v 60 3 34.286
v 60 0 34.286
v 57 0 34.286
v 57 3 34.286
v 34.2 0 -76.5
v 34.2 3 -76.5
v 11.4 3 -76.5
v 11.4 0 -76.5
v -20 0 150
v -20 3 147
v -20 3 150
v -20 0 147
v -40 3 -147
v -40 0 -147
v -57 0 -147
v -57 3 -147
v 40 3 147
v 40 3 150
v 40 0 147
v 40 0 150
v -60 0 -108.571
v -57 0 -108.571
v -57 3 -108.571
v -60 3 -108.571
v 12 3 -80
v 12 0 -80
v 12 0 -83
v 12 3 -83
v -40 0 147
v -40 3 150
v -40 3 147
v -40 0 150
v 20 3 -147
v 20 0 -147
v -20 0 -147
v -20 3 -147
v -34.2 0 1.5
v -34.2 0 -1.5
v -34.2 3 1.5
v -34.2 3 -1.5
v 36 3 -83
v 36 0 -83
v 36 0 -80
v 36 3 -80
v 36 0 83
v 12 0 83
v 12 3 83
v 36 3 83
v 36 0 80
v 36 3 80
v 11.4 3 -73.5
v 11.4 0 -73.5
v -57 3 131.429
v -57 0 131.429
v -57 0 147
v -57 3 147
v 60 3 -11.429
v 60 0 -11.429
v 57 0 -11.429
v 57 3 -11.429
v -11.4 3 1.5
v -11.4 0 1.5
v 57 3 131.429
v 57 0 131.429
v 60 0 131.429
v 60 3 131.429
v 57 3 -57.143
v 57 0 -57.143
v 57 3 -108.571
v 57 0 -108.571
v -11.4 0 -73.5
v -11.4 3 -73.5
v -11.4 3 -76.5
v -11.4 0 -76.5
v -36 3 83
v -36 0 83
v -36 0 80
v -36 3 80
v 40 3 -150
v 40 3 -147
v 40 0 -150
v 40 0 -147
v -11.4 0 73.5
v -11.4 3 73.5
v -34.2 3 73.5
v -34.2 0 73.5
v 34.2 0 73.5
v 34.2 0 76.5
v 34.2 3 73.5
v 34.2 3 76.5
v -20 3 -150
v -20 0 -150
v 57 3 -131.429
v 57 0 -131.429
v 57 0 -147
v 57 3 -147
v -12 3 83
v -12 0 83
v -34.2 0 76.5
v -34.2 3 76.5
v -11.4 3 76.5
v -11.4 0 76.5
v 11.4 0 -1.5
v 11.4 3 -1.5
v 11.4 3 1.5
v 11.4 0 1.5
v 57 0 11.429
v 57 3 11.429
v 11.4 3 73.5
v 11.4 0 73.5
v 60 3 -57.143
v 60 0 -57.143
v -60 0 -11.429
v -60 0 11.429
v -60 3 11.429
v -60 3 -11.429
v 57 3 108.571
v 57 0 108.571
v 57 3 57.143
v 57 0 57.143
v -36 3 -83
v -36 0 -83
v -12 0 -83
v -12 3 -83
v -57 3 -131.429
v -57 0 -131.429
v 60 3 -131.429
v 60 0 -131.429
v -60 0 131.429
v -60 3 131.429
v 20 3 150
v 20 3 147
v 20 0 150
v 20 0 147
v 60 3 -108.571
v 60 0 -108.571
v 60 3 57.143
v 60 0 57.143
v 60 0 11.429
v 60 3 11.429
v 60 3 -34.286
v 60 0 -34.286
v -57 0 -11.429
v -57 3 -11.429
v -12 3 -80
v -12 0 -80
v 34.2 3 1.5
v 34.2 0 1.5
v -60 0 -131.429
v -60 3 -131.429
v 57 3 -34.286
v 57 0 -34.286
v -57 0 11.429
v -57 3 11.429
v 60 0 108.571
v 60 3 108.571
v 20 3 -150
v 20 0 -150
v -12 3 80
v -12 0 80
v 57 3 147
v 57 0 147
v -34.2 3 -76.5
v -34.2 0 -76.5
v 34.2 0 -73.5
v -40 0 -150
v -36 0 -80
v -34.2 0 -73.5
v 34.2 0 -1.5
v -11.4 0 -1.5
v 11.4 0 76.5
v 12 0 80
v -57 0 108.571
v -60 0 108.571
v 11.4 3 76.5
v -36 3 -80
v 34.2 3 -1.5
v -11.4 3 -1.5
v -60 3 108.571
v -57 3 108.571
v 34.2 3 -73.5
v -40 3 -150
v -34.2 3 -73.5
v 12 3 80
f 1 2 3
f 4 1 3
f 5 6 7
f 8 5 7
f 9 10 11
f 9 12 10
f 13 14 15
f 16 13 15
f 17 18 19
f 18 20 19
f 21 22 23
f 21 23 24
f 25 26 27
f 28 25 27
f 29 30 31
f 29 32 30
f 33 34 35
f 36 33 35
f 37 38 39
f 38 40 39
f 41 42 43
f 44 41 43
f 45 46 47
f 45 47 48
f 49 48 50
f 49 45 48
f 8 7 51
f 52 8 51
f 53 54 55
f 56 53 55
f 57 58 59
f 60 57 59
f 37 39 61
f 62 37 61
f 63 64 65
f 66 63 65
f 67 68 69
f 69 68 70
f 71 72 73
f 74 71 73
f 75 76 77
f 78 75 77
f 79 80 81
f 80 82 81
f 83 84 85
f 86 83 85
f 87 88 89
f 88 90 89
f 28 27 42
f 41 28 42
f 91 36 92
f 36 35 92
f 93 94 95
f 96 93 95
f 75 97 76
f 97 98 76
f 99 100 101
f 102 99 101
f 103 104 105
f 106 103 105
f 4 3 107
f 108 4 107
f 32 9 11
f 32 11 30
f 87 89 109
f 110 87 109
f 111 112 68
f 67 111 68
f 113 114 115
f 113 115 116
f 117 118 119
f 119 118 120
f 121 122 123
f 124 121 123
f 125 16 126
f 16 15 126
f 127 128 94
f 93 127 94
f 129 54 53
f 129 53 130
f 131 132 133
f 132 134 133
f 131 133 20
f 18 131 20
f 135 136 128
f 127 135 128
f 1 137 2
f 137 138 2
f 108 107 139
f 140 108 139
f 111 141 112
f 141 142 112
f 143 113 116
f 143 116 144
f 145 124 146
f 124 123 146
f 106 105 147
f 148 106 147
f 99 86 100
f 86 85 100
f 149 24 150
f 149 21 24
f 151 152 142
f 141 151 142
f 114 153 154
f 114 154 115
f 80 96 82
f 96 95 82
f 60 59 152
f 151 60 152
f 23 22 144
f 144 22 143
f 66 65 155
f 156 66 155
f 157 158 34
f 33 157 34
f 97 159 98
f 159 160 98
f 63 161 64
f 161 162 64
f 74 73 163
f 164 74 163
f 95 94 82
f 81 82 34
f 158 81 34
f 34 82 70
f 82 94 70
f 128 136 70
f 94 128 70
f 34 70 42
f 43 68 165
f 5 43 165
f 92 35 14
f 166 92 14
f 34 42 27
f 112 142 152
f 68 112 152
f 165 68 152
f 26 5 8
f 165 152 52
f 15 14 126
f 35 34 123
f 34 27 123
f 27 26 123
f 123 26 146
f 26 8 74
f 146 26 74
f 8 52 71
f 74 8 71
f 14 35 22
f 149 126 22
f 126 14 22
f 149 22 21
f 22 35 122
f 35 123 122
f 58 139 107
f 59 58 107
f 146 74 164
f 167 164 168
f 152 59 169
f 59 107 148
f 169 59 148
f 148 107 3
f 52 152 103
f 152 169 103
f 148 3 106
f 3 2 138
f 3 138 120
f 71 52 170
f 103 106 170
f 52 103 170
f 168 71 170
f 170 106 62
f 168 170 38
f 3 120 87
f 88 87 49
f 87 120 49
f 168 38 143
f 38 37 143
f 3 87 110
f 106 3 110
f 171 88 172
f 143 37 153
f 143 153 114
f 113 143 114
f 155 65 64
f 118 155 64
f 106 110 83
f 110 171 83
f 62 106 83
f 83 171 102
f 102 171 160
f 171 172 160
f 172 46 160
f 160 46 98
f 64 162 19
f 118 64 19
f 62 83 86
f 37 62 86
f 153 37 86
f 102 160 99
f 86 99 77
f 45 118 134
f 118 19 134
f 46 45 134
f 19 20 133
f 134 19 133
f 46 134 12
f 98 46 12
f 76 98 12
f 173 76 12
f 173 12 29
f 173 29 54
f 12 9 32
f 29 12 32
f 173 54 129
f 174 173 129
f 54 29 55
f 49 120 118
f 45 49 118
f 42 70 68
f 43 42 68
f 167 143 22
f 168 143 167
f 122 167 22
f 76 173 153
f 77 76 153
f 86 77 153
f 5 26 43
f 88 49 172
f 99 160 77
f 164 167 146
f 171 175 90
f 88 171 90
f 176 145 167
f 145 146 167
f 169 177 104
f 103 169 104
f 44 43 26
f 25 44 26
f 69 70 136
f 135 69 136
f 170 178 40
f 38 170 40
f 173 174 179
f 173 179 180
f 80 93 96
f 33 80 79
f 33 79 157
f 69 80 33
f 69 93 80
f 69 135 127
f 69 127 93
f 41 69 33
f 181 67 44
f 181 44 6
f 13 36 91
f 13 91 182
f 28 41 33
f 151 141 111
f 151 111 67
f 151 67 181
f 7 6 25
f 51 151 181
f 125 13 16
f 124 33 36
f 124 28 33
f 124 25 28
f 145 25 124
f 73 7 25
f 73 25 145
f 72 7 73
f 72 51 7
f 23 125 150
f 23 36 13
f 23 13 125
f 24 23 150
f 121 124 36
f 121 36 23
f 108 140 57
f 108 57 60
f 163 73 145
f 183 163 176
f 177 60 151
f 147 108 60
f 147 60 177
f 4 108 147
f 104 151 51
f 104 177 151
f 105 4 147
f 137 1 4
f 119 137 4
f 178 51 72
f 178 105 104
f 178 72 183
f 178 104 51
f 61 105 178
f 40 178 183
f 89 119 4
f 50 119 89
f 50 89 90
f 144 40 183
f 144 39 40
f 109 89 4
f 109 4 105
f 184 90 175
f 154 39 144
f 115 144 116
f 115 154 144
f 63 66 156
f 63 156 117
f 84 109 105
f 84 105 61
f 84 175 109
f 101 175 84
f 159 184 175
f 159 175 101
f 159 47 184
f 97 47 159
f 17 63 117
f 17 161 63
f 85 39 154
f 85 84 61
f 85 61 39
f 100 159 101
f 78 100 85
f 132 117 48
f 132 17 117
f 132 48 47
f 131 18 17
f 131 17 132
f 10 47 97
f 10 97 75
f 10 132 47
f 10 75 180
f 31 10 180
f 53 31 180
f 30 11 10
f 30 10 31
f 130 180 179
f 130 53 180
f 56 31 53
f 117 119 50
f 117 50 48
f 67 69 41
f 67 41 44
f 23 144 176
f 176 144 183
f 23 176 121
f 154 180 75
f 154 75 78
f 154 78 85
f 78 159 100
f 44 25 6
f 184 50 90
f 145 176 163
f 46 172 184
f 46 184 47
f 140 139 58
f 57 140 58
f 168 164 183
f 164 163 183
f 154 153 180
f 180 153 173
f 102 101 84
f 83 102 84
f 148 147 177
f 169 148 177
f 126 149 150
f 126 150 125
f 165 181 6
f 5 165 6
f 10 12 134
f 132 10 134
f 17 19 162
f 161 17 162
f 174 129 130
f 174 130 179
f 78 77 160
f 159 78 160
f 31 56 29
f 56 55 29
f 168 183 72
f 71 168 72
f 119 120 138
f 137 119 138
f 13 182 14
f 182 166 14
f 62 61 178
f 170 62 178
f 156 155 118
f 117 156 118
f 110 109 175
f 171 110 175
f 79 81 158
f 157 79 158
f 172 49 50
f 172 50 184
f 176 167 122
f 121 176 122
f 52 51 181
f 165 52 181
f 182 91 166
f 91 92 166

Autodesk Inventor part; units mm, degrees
ref_plane "YZ Plane" through (0, 0, 0) normal (1, 0, 0) x (0, 1, 0)
ref_plane "XZ Plane" through (0, 0, 0) normal (0, 1, 0) x (-1, 0, 0)
ref_plane "XY Plane" through (0, 0, 0) normal (0, 0, 1) x (1, 0, 0)
sketch "Sketch1" plane through (0, 0, 0) normal (0, 1, 0) x (-1, 0, 0)
  line L0 (20, 147) -> (20, 150)
  line L1 (20, 150) -> (40, 150)
  line L2 (40, 150) -> (40, 147)
  line L3 (-20, 147) -> (-20, 150)
  line L4 (-20, 150) -> (-40, 150)
  line L5 (-40, 150) -> (-40, 147)
  line L6 (-40, 147) -> (-57, 147)
  line L7 (57, 147) -> (40, 147)
  line L8 (20, 147) -> (-20, 147)
  line L9 (20, -147) -> (20, -150)
  line L10 (20, -150) -> (40, -150)
  line L11 (40, -150) -> (40, -147)
  line L12 (-40, -147) -> (-40, -150)
  line L13 (-40, -150) -> (-20, -150)
  line L14 (-20, -150) -> (-20, -147)
  line L15 (40, -147) -> (57, -147)
  line L16 (-57, -147) -> (-40, -147)
  line L17 (-20, -147) -> (20, -147)
  line L18 (-57, 131.4286) -> (-60, 131.4286)
  line L19 (-60, 131.4286) -> (-60, 108.5714)
  line L20 (-60, 108.5714) -> (-57, 108.5714)
  line L21 (-57, 11.4286) -> (-60, 11.4286)
  line L22 (-60, 11.4286) -> (-60, -11.4286)
  line L23 (-60, -11.4286) -> (-57, -11.4286)
  line L24 (-57, -108.5714) -> (-60, -108.5714)
  line L25 (-60, -108.5714) -> (-60, -131.4286)
  line L26 (-60, -131.4286) -> (-57, -131.4286)
  line L27 (-57, 147) -> (-57, 131.4286)
  line L28 (-57, -131.4286) -> (-57, -147)
  line L29 (57, 131.4286) -> (60, 131.4286)
  line L30 (60, 131.4286) -> (60, 108.5714)
  line L31 (60, 108.5714) -> (57, 108.5714)
  line L32 (57, 11.4286) -> (60, 11.4286)
  line L33 (60, 11.4286) -> (60, -11.4286)
  line L34 (60, -11.4286) -> (57, -11.4286)
  line L35 (57, -108.5714) -> (60, -108.5714)
  line L36 (60, -108.5714) -> (60, -131.4286)
  line L37 (60, -131.4286) -> (57, -131.4286)
  line L38 (57, 131.4286) -> (57, 147)
  line L39 (57, 11.4286) -> (57, 108.5714)
  line L40 (57, -147) -> (57, -131.4286)
  line L41 (57, -108.5714) -> (57, -11.4286)
  line L42 (-57, 57.1429) -> (-60, 57.1429)
  line L43 (-60, 57.1429) -> (-60, 34.2857)
  line L44 (-60, 34.2857) -> (-57, 34.2857)
  line L45 (-57, -34.2857) -> (-60, -34.2857)
  line L46 (-60, -34.2857) -> (-60, -57.1429)
  line L47 (-60, -57.1429) -> (-57, -57.1429)
  line L48 (-57, 108.5714) -> (-57, 57.1429)
  line L49 (-57, 34.2857) -> (-57, 11.4286)
  line L50 (-57, -11.4286) -> (-57, -34.2857)
  line L51 (-57, -57.1429) -> (-57, -108.5714)
  line L52 (-36, 80) -> (-12, 80)
  line L53 (-12, 80) -> (-12, 83)
  line L54 (-12, 83) -> (-36, 83)
  line L55 (-36, 83) -> (-36, 80)
  line L56 (-36, -80) -> (-12, -80)
  line L57 (-12, -80) -> (-12, -83)
  line L58 (-12, -83) -> (-36, -83)
  line L59 (-36, -83) -> (-36, -80)
  line L60 (12, 83) -> (36, 83)
  line L61 (36, 83) -> (36, 80)
  line L62 (36, 80) -> (12, 80)
  line L63 (12, 80) -> (12, 83)
  line L64 (12, -80) -> (36, -80)
  line L65 (36, -80) -> (36, -83)
  line L66 (36, -83) -> (12, -83)
  line L67 (12, -83) -> (12, -80)
  point P0 (0, 0)
  point P1 (-60, 120)
  point P2 (-60, -120)
  dimension "d1" = 294
  dimension "d5" = 20
  dimension "d7" = 20
  dimension "d9" = 3
  dimension "d10" = 147
  dimension "d11" = 3
  dimension "d12" = 57
  dimension "d13" = 3
  dimension "d14" = 17
  dimension "d15" = 3
  dimension "d16" = 17
  dimension "d17" = 22.8571
  dimension "d18" = 11.4286
  dimension "d20" = 120
  dimension "d21" = 17
  dimension "d24" = 114
  dimension "d25" = 22.8571
  dimension "d26" = 24
  dimension "d27" = 3
  dimension "d28" = 3
  dimension "d29" = 22.8571
  dimension "d30" = 24
  dimension "d31" = 24
  dimension "d32" = 22.8571
  dimension "d33" = 120
extrude "Extrusion1" add sketch "Sketch1" along normal blind 3
sketch "Sketch2" plane through (0, 3, 0) normal (0, 1, 0) x (1, 0, 0)
  line L0 (34.2, 76.5) -> (11.4, 76.5)
  line L1 (11.4, 76.5) -> (11.4, 73.5)
  line L2 (11.4, 73.5) -> (34.2, 73.5)
  line L3 (34.2, 73.5) -> (34.2, 76.5)
  line L4 (-11.4, 76.5) -> (-34.2, 76.5)
  line L5 (-34.2, 76.5) -> (-34.2, 73.5)
  line L6 (-34.2, 73.5) -> (-11.4, 73.5)
  line L7 (-11.4, 73.5) -> (-11.4, 76.5)
  line L8 (34.2, 73.5) -> (57, 73.5) construction
  line L9 (11.4, 73.5) -> (-11.4, 73.5) construction
  line L10 (-34.2, 73.5) -> (-57, 73.5) construction
  line L11 (-57, 108.5714) -> (-57, 11.4286) projected
  line L12 (57, 57.1429) -> (57, 108.5714) projected
  point P0 (0, 0)
  dimension "d34" = 22.8
  dimension "d35" = 22.8
  dimension "d36" = 3
  dimension "d37" = 73.5
extrude "Extrusion2" cut sketch "Sketch2" against normal through all
pattern_linear "Rectangular Pattern1" count 3 spacing 75 along (0, 0, 1) of "Extrusion2"
equation "\"d1\" = wt - 2 * tt"
equation "\"d9\" = tt"
equation "\"d10\" = 0.5 * wt - tt"
equation "\"d11\" = tt"
equation "\"d12\" = 0.5 * ht - tt"
equation "\"d13\" = tt"
equation "\"d15\" = tt"
equation "\"d17\" = 0.142857 * shelfW + 2 * tol"
equation "\"d18\" = 0.0714286 * shelfW + tol"
equation "\"d20\" = 0.4 * wt"
equation "\"d24\" = ht - 2 * tt"
equation "\"d25\" = 0.142857 * shelfW - 2 * tol"
equation "\"d26\" = 0.2 * ht + 2 * tol"
equation "\"d27\" = tt"
equation "\"d28\" = tt"
equation "\"d29\" = 0.142857 * shelfW - tol"
equation "\"d30\" = 0.2 * ht - tol"
equation "\"d31\" = 0.2 * ht - 2 * tol"
equation "\"d32\" = 0.142857 * shelfW - tol"
equation "\"d33\" = 0.4 * wt"
equation "\"d22\" = tt"
equation "\"d34\" = -0.4 * tt + 0.2 * ht + 2 * tol"
equation "\"d36\" = tt"
equation "\"d37\" = 0.25 * wt - 0.5 * tt"
equation "\"d42\" = 0.25 * wt"
equation "\"d0\" = 0.5 * wt - tt"
equation "\"tt\" = 3"
equation "\"tol\" = 0"
equation "\"tiroir\" = 1"
equation "\"nHoles\" = 4"
equation "\"shelfH\" = 35"
equation "\"d3\" = 0.5 * ht - tt"
equation "\"wt\" = 300"
equation "\"shelfW\" = 160"
equation "\"ht\" = 120"
properties part number "in_separator"
